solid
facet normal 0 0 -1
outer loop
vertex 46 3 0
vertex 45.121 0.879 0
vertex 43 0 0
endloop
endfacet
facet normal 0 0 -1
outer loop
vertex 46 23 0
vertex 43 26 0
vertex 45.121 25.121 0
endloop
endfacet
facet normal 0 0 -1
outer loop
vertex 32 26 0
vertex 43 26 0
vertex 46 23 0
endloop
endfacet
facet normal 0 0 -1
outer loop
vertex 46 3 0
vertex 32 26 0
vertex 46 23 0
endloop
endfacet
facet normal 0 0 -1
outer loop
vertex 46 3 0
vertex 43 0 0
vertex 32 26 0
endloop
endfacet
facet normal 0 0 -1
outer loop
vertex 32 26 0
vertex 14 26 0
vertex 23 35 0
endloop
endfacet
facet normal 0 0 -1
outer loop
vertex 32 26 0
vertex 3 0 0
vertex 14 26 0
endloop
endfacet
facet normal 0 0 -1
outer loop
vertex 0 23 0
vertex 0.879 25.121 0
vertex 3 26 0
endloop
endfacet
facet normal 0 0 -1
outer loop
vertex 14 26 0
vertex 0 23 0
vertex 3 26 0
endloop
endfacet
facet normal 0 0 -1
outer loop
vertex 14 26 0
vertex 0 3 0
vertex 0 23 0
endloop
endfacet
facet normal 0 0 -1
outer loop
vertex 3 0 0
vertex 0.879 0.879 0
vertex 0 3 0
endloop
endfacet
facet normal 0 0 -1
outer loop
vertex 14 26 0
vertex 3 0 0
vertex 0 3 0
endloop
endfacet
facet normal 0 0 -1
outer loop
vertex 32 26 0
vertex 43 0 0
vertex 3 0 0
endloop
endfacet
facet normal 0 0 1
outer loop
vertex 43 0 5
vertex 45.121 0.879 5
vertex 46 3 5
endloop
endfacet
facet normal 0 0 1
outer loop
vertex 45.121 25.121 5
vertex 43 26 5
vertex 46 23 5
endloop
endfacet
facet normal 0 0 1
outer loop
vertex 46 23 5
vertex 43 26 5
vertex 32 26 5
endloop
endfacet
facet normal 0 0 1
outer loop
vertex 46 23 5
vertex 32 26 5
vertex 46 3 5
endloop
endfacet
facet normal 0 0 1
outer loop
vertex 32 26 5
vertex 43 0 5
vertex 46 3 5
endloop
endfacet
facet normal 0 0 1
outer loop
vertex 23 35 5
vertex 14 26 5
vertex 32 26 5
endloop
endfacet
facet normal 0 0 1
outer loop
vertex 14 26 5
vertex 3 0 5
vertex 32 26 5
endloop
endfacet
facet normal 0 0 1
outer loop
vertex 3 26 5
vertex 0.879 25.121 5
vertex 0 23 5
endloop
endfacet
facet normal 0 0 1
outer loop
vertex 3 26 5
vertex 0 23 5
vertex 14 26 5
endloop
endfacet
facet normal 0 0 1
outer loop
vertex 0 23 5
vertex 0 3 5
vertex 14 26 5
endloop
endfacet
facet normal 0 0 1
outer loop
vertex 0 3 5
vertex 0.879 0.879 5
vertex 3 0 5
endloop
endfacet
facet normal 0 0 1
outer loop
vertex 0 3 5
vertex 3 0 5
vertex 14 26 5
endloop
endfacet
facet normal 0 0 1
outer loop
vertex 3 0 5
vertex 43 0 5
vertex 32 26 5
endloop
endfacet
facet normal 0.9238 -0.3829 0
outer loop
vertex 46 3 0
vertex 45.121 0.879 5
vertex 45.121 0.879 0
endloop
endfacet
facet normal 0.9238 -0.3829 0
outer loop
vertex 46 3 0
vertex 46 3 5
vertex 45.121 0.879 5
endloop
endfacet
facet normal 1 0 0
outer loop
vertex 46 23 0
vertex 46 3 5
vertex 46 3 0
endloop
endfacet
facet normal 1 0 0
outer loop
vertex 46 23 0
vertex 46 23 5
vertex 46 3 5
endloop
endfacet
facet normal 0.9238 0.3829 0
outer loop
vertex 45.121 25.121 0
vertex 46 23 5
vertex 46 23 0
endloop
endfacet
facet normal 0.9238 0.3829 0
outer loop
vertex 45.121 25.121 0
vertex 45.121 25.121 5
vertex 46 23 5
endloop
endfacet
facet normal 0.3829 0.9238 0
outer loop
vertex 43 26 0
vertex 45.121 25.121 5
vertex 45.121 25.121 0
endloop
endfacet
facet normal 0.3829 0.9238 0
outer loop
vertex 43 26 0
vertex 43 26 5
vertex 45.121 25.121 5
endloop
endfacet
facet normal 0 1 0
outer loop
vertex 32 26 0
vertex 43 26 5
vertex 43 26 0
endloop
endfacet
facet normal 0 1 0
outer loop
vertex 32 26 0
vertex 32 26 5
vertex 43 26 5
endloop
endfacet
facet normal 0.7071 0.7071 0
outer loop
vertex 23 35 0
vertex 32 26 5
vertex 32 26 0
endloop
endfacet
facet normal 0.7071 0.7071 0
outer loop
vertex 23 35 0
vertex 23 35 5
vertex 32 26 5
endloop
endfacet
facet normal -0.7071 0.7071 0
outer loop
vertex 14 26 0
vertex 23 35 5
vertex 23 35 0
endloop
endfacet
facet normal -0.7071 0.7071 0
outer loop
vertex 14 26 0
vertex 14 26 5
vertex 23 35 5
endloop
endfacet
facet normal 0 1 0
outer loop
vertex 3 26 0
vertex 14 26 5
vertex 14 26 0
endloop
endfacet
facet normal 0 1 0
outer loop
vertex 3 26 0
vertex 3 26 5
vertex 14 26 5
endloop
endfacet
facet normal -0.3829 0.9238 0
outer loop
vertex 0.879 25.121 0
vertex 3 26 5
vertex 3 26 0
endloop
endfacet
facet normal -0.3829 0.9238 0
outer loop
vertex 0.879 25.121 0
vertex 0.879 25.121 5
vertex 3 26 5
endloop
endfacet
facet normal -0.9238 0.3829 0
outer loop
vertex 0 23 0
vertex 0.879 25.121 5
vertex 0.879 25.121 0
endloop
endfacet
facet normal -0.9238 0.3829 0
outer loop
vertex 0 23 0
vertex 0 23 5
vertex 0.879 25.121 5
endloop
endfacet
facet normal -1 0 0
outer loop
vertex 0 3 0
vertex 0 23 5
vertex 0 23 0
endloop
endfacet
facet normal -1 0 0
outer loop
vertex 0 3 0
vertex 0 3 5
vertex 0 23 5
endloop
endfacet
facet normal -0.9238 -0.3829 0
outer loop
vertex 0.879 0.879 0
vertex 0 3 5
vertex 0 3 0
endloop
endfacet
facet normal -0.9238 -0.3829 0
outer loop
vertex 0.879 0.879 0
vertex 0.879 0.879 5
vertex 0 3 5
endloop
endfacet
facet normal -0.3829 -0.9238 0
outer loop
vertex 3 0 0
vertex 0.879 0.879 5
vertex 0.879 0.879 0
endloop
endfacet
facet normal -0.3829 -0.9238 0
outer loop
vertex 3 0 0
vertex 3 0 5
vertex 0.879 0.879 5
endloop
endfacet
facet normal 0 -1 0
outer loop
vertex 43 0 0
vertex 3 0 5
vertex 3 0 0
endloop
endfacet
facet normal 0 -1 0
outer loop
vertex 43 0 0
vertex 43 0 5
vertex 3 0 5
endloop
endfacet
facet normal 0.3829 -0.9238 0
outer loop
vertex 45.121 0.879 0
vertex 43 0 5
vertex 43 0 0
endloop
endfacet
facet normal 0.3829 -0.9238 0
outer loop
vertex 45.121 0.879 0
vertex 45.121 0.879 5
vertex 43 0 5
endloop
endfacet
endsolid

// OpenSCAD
$fn = 32;

// ----------------------------------------------------------------------
// Ratchet pawl: 46 x 26 mm body, beak 9 mm сверху
// ----------------------------------------------------------------------

// --- parameters (mm) ---
profile_height = 5;       // extrusion height
profile_points = 15;      // points of the closed outline

profile = [[0, 3], [0.879, 0.879], [3, 0], [43, 0], [45.121, 0.879], [46, 3], [46, 23], [45.121, 25.121], [43, 26], [32, 26], [23, 35], [14, 26], [3, 26], [0.879, 25.121], [0, 23]];  // single closed polygon, 15 points, counter clockwise

// --- the one profile operation ---
linear_extrude(height = profile_height) polygon(points = profile);
